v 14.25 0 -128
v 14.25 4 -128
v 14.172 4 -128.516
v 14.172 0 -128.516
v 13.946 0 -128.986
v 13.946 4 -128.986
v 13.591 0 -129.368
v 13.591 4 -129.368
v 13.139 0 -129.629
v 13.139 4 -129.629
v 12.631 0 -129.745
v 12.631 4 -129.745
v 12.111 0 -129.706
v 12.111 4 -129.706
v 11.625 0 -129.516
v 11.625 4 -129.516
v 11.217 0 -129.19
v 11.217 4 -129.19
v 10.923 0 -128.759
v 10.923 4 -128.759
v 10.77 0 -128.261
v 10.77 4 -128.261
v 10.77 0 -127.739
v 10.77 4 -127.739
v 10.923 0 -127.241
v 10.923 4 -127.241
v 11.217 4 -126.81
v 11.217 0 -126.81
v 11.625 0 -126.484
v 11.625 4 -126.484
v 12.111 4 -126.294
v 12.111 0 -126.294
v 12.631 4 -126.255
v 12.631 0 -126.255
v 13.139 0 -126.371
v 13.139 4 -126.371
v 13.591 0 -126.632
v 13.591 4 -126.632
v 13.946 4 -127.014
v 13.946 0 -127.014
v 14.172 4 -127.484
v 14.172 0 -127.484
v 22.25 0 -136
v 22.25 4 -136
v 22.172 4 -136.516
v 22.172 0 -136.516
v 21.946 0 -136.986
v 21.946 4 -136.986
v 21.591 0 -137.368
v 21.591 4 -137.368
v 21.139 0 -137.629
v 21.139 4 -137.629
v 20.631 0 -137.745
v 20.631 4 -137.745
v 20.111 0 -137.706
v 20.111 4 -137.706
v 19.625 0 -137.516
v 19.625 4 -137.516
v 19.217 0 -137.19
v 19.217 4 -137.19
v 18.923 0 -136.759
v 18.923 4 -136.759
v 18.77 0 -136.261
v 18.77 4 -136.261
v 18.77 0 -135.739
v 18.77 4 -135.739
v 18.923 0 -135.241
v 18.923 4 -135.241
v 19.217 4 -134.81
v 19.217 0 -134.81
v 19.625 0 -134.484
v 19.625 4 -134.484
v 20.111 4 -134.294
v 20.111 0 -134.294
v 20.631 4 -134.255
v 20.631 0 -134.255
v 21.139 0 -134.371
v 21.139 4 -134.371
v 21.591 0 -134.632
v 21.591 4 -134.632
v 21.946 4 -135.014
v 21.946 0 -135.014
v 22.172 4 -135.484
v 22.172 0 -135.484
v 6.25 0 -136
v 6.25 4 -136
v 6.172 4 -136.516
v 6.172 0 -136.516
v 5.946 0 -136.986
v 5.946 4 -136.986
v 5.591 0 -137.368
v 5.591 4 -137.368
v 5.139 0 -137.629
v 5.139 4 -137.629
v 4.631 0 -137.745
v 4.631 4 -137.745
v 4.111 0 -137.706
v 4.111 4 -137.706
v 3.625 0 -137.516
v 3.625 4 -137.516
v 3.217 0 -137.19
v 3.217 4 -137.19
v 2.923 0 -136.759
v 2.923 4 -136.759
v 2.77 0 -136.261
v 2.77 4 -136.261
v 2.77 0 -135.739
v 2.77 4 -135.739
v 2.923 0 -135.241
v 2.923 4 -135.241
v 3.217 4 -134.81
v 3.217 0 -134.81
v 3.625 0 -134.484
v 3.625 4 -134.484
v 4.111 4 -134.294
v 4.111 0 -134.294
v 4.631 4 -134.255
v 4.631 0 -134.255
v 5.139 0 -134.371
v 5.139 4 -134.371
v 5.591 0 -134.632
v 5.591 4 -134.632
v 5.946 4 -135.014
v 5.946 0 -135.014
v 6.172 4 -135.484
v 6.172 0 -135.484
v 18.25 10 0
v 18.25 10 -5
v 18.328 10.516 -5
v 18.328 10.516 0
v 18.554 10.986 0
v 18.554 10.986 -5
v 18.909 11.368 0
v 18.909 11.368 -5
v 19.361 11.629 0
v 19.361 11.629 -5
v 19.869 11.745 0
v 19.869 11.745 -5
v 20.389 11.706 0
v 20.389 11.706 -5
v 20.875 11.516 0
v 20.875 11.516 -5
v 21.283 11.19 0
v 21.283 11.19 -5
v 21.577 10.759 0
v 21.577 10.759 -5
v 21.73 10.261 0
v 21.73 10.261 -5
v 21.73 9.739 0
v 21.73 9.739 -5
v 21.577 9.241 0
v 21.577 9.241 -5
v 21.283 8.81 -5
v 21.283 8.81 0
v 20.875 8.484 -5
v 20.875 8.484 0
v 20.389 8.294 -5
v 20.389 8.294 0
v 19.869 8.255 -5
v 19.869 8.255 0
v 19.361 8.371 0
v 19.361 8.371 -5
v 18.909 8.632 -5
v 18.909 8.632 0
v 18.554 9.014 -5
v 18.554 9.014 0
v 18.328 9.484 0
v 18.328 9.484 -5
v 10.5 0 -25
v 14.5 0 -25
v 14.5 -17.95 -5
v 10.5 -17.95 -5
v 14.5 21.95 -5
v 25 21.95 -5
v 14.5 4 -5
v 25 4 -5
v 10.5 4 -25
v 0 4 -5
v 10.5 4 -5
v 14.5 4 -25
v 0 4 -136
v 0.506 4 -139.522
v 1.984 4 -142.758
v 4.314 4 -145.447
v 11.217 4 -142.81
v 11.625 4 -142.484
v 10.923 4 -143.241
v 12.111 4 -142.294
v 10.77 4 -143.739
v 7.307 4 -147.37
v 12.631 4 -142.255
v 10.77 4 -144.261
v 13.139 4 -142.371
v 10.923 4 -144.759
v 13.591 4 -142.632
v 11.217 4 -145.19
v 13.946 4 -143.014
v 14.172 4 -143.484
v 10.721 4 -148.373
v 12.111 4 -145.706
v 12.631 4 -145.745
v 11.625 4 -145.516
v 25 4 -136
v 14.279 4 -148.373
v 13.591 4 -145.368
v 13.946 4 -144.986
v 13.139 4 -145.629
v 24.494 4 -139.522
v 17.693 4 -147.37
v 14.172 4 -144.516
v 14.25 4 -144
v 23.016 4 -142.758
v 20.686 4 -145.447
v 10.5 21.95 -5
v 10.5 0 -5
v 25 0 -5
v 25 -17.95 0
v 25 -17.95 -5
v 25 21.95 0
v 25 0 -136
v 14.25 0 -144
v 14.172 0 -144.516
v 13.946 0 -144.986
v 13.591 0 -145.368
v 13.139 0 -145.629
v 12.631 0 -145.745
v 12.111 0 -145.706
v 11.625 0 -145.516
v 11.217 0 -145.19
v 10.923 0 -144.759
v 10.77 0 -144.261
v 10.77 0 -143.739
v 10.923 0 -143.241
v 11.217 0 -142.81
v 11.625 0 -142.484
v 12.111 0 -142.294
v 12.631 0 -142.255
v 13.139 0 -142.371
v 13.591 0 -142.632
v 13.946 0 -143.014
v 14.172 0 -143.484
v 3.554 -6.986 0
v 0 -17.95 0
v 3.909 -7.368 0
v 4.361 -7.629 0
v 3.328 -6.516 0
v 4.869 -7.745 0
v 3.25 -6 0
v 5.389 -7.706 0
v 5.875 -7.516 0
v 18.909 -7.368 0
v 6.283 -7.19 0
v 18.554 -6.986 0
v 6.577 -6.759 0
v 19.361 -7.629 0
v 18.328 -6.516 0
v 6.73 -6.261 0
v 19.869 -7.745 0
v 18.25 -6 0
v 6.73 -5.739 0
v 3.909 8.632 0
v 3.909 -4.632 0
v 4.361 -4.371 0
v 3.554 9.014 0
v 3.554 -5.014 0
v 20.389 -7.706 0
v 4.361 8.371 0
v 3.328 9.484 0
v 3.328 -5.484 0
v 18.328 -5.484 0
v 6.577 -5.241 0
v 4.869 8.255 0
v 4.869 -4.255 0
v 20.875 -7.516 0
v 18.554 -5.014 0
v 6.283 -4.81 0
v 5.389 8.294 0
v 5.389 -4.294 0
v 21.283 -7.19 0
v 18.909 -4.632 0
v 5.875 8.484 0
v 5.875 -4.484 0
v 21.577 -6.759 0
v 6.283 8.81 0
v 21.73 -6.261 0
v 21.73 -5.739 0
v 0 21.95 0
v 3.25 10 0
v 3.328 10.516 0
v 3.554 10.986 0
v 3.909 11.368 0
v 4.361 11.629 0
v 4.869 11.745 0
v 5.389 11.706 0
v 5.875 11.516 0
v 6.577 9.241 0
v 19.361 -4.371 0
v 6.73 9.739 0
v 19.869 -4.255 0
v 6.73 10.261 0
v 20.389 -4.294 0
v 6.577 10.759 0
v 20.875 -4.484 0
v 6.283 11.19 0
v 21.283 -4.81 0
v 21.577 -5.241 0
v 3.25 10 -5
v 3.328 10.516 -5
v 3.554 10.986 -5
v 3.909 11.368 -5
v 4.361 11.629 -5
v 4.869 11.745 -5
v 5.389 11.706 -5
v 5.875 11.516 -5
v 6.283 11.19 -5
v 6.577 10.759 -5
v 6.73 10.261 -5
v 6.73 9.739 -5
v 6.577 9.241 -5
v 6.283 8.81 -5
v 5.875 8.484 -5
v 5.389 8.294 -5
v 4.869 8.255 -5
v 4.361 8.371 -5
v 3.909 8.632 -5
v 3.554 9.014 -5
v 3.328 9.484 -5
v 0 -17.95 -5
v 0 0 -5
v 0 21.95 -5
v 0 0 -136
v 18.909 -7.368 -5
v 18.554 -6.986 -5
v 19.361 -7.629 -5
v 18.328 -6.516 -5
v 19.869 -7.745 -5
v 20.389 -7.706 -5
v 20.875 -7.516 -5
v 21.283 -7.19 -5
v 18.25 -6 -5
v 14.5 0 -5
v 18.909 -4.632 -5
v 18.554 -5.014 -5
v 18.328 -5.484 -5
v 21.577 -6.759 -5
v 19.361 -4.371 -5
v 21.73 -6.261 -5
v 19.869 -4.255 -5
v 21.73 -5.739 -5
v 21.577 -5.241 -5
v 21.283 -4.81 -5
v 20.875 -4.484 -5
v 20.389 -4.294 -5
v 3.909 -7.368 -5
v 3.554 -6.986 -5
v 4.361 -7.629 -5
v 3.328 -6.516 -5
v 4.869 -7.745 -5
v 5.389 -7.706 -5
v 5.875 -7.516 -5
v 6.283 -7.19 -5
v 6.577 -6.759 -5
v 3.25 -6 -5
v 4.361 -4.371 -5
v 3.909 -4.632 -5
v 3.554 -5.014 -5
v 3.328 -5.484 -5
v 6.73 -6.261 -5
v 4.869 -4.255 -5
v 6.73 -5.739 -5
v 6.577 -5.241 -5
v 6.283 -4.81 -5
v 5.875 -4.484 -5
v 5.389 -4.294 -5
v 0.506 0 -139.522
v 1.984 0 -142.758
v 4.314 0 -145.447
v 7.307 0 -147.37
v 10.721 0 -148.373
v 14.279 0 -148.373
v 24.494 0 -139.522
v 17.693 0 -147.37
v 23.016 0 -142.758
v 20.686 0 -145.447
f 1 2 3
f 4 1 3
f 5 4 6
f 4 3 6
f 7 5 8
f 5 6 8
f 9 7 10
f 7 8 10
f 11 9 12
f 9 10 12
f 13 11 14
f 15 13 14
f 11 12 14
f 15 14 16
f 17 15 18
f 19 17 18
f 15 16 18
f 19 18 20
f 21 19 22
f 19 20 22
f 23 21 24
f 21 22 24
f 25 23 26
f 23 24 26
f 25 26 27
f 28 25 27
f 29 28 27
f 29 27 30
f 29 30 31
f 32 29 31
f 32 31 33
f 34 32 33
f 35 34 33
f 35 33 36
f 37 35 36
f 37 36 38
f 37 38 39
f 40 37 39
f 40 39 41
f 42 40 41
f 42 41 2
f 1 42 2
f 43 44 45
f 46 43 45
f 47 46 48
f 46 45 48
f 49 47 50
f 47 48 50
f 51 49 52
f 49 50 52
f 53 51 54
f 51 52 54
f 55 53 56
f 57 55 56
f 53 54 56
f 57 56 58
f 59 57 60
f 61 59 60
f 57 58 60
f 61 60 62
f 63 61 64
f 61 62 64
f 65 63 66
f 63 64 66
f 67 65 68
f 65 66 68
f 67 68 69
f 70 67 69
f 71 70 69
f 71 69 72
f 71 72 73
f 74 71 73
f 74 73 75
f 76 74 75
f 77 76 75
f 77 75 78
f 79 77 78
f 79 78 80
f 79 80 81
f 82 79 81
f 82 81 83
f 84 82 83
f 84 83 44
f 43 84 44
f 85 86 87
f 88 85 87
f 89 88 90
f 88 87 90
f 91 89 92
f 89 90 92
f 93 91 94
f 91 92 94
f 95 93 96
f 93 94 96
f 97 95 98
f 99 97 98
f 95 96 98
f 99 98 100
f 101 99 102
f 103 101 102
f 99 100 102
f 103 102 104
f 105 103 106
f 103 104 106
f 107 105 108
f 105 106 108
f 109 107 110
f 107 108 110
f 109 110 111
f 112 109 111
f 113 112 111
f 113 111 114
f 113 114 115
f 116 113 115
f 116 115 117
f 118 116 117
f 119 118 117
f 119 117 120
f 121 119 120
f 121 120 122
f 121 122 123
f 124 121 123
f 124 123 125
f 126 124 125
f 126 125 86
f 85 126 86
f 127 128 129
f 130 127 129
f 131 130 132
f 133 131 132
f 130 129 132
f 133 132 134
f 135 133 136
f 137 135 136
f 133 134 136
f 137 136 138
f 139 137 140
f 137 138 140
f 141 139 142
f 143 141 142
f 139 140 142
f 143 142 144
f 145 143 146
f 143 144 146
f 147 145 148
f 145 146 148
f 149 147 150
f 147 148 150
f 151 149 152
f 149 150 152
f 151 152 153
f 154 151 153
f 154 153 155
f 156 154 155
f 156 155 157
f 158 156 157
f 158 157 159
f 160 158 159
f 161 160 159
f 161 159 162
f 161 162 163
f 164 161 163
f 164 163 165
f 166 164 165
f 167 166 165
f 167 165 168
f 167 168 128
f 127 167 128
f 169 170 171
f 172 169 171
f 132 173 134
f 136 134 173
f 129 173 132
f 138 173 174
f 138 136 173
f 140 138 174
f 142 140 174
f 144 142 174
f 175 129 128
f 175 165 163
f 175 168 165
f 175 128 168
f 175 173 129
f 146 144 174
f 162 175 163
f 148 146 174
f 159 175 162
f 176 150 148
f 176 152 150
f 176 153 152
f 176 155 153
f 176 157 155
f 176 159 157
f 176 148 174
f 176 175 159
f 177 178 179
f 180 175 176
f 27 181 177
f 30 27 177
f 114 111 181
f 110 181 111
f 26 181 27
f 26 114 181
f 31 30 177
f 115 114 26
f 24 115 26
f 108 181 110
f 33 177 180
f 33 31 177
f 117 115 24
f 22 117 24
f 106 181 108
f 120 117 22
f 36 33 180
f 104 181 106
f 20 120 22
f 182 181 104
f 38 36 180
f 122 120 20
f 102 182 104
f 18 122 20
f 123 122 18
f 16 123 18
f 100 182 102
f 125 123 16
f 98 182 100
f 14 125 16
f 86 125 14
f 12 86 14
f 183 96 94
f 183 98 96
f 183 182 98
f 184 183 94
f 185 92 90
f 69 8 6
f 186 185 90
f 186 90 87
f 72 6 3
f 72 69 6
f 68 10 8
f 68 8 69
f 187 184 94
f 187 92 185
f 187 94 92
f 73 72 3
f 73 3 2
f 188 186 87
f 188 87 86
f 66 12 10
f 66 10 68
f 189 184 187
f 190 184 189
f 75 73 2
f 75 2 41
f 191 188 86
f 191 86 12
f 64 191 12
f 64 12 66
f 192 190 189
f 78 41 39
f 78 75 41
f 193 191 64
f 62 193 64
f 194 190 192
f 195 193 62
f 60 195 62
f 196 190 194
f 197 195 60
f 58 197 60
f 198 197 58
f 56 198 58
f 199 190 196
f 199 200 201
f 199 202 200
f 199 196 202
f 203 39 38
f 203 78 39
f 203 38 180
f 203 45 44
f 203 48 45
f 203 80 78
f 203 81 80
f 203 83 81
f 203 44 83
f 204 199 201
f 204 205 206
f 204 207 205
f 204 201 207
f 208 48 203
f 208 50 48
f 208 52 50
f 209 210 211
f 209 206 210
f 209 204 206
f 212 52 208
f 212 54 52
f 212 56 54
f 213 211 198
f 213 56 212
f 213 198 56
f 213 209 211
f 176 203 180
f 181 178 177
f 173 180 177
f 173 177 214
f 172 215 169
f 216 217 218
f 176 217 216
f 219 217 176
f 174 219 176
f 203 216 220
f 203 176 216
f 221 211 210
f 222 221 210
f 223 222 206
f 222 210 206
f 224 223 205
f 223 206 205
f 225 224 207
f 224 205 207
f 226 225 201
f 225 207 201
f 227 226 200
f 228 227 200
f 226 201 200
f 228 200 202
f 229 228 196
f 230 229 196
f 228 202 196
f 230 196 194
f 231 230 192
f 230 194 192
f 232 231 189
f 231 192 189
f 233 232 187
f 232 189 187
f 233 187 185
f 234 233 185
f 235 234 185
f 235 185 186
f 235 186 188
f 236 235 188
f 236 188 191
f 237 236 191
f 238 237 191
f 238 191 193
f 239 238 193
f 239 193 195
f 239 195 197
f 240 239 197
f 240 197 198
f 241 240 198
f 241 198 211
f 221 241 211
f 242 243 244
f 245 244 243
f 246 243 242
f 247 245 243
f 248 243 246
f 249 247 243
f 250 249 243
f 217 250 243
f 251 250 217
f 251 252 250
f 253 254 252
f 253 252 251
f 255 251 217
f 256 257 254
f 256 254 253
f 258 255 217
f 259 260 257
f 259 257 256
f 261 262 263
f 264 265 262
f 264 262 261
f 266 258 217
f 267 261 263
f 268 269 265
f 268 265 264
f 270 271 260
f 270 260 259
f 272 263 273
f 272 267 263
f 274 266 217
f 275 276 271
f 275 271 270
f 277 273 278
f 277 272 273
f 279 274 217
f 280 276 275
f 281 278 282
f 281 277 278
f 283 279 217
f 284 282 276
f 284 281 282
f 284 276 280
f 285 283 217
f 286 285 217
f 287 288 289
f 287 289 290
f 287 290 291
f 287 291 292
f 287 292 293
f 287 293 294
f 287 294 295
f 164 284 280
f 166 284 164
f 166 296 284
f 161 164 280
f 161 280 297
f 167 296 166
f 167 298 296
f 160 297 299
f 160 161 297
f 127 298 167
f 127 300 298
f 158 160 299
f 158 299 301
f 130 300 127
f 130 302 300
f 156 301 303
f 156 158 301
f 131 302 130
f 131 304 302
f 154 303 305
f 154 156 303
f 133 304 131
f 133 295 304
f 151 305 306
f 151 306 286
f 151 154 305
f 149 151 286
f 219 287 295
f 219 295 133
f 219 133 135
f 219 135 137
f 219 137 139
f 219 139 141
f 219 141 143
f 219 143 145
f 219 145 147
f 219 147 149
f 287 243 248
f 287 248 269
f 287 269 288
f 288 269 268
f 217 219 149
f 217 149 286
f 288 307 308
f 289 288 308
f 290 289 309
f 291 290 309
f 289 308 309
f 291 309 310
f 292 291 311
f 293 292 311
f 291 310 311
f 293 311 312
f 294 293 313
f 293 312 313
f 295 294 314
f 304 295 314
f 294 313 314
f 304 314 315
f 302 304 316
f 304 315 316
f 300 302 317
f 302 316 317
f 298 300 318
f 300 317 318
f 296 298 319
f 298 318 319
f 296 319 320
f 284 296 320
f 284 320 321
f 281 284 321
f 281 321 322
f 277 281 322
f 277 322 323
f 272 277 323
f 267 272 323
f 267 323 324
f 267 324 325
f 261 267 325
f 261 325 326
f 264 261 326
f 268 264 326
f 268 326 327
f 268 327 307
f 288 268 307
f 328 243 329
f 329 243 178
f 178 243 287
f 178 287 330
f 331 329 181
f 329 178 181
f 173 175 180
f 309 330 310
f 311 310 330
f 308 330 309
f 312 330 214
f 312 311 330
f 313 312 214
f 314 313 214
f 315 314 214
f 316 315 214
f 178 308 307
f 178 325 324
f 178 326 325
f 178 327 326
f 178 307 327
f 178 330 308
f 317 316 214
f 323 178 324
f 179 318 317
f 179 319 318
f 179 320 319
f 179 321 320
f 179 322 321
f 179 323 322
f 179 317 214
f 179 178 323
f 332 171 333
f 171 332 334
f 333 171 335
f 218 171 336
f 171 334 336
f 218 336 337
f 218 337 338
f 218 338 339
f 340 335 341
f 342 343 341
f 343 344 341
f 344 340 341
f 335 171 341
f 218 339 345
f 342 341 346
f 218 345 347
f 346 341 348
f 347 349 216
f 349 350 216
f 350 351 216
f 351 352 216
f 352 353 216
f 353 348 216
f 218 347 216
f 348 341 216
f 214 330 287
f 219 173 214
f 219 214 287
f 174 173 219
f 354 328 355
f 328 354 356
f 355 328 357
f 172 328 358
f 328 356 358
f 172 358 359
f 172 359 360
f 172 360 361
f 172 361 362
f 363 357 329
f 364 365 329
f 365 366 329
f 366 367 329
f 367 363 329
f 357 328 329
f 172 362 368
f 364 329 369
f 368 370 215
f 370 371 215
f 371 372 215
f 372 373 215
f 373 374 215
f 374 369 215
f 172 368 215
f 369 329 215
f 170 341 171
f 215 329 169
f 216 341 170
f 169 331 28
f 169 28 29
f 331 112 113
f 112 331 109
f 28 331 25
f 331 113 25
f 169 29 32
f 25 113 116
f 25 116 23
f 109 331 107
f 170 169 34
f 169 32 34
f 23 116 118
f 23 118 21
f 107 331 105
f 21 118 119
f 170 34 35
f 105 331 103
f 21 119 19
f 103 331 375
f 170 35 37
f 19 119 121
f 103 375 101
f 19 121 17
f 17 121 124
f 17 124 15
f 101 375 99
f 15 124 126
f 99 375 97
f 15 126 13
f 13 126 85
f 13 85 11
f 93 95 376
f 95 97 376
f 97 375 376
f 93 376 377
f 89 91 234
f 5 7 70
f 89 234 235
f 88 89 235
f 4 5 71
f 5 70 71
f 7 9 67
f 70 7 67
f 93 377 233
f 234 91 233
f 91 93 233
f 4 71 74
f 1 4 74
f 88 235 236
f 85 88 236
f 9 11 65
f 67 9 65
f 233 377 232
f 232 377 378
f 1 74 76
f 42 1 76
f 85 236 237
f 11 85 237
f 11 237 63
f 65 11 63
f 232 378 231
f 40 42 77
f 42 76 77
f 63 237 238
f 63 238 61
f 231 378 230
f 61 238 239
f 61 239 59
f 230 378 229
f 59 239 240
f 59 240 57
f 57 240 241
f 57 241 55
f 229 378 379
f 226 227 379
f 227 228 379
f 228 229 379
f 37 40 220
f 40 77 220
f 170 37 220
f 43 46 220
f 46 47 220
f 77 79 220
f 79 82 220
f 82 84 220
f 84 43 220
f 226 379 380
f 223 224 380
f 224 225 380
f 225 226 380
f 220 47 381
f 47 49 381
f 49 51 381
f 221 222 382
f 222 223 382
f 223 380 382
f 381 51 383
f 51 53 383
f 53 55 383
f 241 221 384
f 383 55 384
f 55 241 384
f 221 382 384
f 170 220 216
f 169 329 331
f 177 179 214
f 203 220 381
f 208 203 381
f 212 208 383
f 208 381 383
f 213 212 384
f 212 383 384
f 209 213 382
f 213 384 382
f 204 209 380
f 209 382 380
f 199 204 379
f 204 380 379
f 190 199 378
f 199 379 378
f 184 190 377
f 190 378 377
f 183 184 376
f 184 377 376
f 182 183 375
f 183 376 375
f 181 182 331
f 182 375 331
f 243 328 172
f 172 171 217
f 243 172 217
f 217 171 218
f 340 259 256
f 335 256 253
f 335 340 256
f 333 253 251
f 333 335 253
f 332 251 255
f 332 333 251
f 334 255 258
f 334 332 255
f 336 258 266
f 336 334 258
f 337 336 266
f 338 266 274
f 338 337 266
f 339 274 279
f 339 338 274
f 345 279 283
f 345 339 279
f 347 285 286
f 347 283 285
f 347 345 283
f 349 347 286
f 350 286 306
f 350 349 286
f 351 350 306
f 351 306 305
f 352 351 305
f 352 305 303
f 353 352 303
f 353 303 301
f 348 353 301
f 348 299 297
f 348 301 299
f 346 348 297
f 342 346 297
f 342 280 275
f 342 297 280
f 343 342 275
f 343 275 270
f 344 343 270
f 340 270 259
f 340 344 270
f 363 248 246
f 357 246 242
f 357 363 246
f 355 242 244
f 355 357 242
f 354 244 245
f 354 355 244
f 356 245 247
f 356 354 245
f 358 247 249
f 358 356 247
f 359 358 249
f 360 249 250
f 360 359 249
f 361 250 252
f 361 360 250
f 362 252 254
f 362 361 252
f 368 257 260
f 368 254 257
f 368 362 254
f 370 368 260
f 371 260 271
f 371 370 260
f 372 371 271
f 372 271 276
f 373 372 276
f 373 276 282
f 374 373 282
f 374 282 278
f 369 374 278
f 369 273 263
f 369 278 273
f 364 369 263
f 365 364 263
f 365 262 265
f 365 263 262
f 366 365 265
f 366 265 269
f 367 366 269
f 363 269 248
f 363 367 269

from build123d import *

# Parameters (mm, degrees)
BOSS_EXTRUDE1_DEPTH = 4
SKETCH2_W           = 25
SKETCH2_H           = 5
BOSS_EXTRUDE2_DEPTH = 17.95
SKETCH3_R           = 1.75
CUT_EXTRUDE1_DEPTH  = 6
SKETCH4_W           = 4
SKETCH4_H           = 17.95
BOSS_EXTRUDE3_DEPTH = 20
CUT_EXTRUDE2_DEPTH  = 15.5
SKETCH6_R           = 1.75
CUT_EXTRUDE3_DEPTH  = 22.95


with BuildPart() as part:
    # Sketch1 → Boss-Extrude1 (new body)
    with BuildSketch(Plane(origin=(0, 0, 0), x_dir=(1, 0, 0), z_dir=(0, 1, 0))):
        with BuildLine():
            Line((0, 0), (25, 0))
            Line((25, 0), (25, 136))
            ThreePointArc((25, 136), (12.5, 148.5), (0, 136))
            Line((0, 136), (0, 0))
        make_face()
    extrude(amount=BOSS_EXTRUDE1_DEPTH)

    # Sketch2 → Boss-Extrude2 (add)
    with BuildSketch(Plane(origin=(0, 4, 0), x_dir=(1, 0, 0), z_dir=(0, 1, 0))):
        with Locations((12.5, 2.5)):
            Rectangle(SKETCH2_W, SKETCH2_H)
    boss_extrude2 = extrude(amount=BOSS_EXTRUDE2_DEPTH)

    # Sketch3 → Cut-Extrude1 (cut, through all)
    with BuildSketch(Plane(origin=(0, 0, -5), x_dir=(-1, 0, 0), z_dir=(0, 0, -1))):
        with Locations((-20, 10)):
            Circle(SKETCH3_R)
        with Locations((-5, 10)):
            Circle(SKETCH3_R)
    cut_extrude1 = extrude(amount=-CUT_EXTRUDE1_DEPTH, mode=Mode.SUBTRACT)

    # Sketch4 → Boss-Extrude3 (add)
    with BuildSketch(Plane(origin=(0, 0, -5), x_dir=(-1, 0, 0), z_dir=(0, 0, -1))):
        with Locations((-12.5, 12.975)):
            Rectangle(SKETCH4_W, SKETCH4_H)
    boss_extrude3 = extrude(amount=BOSS_EXTRUDE3_DEPTH)

    # Sketch5 → Cut-Extrude2 (cut, through all)
    with BuildSketch(Plane(origin=(14.5, 0, 0), x_dir=(0, 0, -1), z_dir=(1, 0, 0))):
        Polygon((25, 4), (5, 21.95), (25, 21.95), align=None)
    cut_extrude2 = extrude(amount=-CUT_EXTRUDE2_DEPTH, mode=Mode.SUBTRACT)

    # Mirror1: Boss-Extrude2, Cut-Extrude1, Boss-Extrude3, Cut-Extrude2 across plane
    add(boss_extrude2.mirror(Plane.ZX.offset(2)))
    add(cut_extrude1.mirror(Plane.ZX.offset(2)), mode=Mode.SUBTRACT)
    add(boss_extrude3.mirror(Plane.ZX.offset(2)))
    add(cut_extrude2.mirror(Plane.ZX.offset(2)), mode=Mode.SUBTRACT)

    # Sketch6 → Cut-Extrude3 (cut, through all)
    with BuildSketch(Plane(origin=(0, 4, 0), x_dir=(1, 0, 0), z_dir=(0, 1, 0))):
        with Locations((12.5, 144)):
            Circle(SKETCH6_R)
        with Locations((20.5, 136)):
            Circle(SKETCH6_R)
        with Locations((12.5, 128)):
            Circle(SKETCH6_R)
        with Locations((4.5, 136)):
            Circle(SKETCH6_R)
    extrude(amount=-CUT_EXTRUDE3_DEPTH, mode=Mode.SUBTRACT)


solid = part.part
